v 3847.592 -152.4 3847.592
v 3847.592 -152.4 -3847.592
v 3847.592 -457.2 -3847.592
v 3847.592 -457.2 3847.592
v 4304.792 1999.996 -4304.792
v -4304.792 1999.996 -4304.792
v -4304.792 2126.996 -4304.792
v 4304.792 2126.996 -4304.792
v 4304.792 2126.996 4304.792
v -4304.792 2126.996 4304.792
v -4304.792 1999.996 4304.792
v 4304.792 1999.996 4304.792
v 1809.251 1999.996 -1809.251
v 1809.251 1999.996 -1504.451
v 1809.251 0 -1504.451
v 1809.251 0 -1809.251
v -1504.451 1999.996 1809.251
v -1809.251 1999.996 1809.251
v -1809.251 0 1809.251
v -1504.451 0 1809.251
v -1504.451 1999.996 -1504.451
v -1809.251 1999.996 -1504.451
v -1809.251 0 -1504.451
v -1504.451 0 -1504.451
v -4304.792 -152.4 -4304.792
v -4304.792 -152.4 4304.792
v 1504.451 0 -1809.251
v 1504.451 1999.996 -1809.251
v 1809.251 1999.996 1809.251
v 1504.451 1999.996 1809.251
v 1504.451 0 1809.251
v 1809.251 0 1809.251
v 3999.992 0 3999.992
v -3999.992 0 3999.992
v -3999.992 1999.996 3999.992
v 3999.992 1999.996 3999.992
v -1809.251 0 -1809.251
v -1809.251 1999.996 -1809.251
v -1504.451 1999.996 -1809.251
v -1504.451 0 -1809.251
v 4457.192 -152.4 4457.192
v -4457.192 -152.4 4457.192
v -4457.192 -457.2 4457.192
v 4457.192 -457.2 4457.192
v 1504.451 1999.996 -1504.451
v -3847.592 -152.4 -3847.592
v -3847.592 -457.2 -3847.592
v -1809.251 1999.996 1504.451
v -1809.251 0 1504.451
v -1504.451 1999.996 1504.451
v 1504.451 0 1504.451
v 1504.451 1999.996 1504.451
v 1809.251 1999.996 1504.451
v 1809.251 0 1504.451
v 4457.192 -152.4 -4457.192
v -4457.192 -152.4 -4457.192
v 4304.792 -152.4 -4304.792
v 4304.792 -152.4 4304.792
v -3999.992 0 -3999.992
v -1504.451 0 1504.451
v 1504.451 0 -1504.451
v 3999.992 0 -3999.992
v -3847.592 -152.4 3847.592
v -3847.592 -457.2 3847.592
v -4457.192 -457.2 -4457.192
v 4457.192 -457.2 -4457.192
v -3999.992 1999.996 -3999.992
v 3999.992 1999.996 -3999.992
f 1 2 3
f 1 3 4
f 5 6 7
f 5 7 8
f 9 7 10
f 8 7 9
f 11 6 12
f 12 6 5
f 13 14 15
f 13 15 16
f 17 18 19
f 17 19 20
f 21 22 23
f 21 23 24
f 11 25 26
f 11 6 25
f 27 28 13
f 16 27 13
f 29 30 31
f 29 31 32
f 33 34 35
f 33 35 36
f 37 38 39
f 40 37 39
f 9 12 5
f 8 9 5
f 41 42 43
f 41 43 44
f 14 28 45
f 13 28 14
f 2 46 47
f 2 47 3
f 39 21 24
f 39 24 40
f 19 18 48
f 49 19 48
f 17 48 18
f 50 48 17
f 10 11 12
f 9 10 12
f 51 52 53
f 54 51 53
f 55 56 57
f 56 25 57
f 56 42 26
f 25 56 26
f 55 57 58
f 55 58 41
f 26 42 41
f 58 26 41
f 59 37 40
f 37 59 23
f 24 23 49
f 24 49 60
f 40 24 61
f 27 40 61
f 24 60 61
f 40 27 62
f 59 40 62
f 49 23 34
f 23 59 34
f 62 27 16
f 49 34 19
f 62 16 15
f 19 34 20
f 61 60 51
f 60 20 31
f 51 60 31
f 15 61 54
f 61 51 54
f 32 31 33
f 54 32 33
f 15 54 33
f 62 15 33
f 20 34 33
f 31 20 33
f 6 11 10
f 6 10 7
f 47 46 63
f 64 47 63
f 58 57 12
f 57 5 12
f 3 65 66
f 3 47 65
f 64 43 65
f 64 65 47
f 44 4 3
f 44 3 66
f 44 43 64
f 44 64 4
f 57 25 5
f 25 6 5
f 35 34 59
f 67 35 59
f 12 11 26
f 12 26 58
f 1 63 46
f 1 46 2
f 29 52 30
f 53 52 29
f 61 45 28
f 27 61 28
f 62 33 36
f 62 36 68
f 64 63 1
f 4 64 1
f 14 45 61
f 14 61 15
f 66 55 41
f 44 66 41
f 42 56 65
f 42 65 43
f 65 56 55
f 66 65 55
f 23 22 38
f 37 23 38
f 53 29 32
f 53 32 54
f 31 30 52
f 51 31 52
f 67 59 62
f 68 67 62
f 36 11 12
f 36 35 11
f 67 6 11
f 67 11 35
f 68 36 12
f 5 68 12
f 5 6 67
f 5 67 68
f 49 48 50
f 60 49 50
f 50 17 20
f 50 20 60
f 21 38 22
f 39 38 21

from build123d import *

# Parameters (mm, degrees)
SKETCH2_W           = 8609.584
SKETCH2_H           = 8609.584
SKETCH2_W_2         = 7999.984
SKETCH2_H_2         = 7999.984
BOSS_EXTRUDE1_DEPTH = 1999.996
SKETCH3_W           = 8609.584
SKETCH3_H           = 8609.584
BOSS_EXTRUDE2_DEPTH = 152.4
SKETCH4_W           = 8914.384
SKETCH4_H           = 8914.384
SKETCH4_W_2         = 7695.184
SKETCH4_H_2         = 7695.184
BOSS_EXTRUDE3_DEPTH = 304.8
SKETCH6_W           = 304.8
SKETCH6_H           = 304.8
BOSS_EXTRUDE5_DEPTH = 1999.996
SKETCH7_W           = 8609.584
SKETCH7_H           = 8609.584
BOSS_EXTRUDE6_DEPTH = 127


with BuildPart() as part:
    # Sketch2 → Boss-Extrude1 (new body)
    with BuildSketch(Plane(origin=(0, 0, 0), x_dir=(1, 0, 0), z_dir=(0, 1, 0))):
        Rectangle(SKETCH2_W, SKETCH2_H)
        Rectangle(SKETCH2_W_2, SKETCH2_H_2, mode=Mode.SUBTRACT)
    extrude(amount=BOSS_EXTRUDE1_DEPTH)

    # Sketch3 → Boss-Extrude2 (add)
    with BuildSketch(Plane.XZ):
        Rectangle(SKETCH3_W, SKETCH3_H)
    extrude(amount=BOSS_EXTRUDE2_DEPTH)

    # Sketch4 → Boss-Extrude3 (add)
    with BuildSketch(Plane.XZ.offset(152.4)):
        Rectangle(SKETCH4_W, SKETCH4_H)
        Rectangle(SKETCH4_W_2, SKETCH4_H_2, mode=Mode.SUBTRACT)
    extrude(amount=BOSS_EXTRUDE3_DEPTH)

    # Sketch6 → Boss-Extrude5 (add)
    with BuildSketch(Plane(origin=(0, 0, 0), x_dir=(1, 0, 0), z_dir=(0, 1, 0))):
        with Locations((1656.850935784, 1656.850935784)):
            Rectangle(SKETCH6_W, SKETCH6_H)
        with Locations((-1656.850935784, 1656.850935784)):
            Rectangle(SKETCH6_W, SKETCH6_H)
        with Locations((1656.850935784, -1656.850935784)):
            Rectangle(SKETCH6_W, SKETCH6_H)
        with Locations((-1656.850935784, -1656.850935784)):
            Rectangle(SKETCH6_W, SKETCH6_H)
    extrude(amount=BOSS_EXTRUDE5_DEPTH)


with BuildPart() as body_2:
    # Sketch7 → Boss-Extrude6 (new body)
    with BuildSketch(Plane(origin=(0, 1999.996, 0), x_dir=(1, 0, 0), z_dir=(0, 1, 0))):
        Rectangle(SKETCH7_W, SKETCH7_H)
    extrude(amount=BOSS_EXTRUDE6_DEPTH)


solid = Compound([part.part, body_2.part])
